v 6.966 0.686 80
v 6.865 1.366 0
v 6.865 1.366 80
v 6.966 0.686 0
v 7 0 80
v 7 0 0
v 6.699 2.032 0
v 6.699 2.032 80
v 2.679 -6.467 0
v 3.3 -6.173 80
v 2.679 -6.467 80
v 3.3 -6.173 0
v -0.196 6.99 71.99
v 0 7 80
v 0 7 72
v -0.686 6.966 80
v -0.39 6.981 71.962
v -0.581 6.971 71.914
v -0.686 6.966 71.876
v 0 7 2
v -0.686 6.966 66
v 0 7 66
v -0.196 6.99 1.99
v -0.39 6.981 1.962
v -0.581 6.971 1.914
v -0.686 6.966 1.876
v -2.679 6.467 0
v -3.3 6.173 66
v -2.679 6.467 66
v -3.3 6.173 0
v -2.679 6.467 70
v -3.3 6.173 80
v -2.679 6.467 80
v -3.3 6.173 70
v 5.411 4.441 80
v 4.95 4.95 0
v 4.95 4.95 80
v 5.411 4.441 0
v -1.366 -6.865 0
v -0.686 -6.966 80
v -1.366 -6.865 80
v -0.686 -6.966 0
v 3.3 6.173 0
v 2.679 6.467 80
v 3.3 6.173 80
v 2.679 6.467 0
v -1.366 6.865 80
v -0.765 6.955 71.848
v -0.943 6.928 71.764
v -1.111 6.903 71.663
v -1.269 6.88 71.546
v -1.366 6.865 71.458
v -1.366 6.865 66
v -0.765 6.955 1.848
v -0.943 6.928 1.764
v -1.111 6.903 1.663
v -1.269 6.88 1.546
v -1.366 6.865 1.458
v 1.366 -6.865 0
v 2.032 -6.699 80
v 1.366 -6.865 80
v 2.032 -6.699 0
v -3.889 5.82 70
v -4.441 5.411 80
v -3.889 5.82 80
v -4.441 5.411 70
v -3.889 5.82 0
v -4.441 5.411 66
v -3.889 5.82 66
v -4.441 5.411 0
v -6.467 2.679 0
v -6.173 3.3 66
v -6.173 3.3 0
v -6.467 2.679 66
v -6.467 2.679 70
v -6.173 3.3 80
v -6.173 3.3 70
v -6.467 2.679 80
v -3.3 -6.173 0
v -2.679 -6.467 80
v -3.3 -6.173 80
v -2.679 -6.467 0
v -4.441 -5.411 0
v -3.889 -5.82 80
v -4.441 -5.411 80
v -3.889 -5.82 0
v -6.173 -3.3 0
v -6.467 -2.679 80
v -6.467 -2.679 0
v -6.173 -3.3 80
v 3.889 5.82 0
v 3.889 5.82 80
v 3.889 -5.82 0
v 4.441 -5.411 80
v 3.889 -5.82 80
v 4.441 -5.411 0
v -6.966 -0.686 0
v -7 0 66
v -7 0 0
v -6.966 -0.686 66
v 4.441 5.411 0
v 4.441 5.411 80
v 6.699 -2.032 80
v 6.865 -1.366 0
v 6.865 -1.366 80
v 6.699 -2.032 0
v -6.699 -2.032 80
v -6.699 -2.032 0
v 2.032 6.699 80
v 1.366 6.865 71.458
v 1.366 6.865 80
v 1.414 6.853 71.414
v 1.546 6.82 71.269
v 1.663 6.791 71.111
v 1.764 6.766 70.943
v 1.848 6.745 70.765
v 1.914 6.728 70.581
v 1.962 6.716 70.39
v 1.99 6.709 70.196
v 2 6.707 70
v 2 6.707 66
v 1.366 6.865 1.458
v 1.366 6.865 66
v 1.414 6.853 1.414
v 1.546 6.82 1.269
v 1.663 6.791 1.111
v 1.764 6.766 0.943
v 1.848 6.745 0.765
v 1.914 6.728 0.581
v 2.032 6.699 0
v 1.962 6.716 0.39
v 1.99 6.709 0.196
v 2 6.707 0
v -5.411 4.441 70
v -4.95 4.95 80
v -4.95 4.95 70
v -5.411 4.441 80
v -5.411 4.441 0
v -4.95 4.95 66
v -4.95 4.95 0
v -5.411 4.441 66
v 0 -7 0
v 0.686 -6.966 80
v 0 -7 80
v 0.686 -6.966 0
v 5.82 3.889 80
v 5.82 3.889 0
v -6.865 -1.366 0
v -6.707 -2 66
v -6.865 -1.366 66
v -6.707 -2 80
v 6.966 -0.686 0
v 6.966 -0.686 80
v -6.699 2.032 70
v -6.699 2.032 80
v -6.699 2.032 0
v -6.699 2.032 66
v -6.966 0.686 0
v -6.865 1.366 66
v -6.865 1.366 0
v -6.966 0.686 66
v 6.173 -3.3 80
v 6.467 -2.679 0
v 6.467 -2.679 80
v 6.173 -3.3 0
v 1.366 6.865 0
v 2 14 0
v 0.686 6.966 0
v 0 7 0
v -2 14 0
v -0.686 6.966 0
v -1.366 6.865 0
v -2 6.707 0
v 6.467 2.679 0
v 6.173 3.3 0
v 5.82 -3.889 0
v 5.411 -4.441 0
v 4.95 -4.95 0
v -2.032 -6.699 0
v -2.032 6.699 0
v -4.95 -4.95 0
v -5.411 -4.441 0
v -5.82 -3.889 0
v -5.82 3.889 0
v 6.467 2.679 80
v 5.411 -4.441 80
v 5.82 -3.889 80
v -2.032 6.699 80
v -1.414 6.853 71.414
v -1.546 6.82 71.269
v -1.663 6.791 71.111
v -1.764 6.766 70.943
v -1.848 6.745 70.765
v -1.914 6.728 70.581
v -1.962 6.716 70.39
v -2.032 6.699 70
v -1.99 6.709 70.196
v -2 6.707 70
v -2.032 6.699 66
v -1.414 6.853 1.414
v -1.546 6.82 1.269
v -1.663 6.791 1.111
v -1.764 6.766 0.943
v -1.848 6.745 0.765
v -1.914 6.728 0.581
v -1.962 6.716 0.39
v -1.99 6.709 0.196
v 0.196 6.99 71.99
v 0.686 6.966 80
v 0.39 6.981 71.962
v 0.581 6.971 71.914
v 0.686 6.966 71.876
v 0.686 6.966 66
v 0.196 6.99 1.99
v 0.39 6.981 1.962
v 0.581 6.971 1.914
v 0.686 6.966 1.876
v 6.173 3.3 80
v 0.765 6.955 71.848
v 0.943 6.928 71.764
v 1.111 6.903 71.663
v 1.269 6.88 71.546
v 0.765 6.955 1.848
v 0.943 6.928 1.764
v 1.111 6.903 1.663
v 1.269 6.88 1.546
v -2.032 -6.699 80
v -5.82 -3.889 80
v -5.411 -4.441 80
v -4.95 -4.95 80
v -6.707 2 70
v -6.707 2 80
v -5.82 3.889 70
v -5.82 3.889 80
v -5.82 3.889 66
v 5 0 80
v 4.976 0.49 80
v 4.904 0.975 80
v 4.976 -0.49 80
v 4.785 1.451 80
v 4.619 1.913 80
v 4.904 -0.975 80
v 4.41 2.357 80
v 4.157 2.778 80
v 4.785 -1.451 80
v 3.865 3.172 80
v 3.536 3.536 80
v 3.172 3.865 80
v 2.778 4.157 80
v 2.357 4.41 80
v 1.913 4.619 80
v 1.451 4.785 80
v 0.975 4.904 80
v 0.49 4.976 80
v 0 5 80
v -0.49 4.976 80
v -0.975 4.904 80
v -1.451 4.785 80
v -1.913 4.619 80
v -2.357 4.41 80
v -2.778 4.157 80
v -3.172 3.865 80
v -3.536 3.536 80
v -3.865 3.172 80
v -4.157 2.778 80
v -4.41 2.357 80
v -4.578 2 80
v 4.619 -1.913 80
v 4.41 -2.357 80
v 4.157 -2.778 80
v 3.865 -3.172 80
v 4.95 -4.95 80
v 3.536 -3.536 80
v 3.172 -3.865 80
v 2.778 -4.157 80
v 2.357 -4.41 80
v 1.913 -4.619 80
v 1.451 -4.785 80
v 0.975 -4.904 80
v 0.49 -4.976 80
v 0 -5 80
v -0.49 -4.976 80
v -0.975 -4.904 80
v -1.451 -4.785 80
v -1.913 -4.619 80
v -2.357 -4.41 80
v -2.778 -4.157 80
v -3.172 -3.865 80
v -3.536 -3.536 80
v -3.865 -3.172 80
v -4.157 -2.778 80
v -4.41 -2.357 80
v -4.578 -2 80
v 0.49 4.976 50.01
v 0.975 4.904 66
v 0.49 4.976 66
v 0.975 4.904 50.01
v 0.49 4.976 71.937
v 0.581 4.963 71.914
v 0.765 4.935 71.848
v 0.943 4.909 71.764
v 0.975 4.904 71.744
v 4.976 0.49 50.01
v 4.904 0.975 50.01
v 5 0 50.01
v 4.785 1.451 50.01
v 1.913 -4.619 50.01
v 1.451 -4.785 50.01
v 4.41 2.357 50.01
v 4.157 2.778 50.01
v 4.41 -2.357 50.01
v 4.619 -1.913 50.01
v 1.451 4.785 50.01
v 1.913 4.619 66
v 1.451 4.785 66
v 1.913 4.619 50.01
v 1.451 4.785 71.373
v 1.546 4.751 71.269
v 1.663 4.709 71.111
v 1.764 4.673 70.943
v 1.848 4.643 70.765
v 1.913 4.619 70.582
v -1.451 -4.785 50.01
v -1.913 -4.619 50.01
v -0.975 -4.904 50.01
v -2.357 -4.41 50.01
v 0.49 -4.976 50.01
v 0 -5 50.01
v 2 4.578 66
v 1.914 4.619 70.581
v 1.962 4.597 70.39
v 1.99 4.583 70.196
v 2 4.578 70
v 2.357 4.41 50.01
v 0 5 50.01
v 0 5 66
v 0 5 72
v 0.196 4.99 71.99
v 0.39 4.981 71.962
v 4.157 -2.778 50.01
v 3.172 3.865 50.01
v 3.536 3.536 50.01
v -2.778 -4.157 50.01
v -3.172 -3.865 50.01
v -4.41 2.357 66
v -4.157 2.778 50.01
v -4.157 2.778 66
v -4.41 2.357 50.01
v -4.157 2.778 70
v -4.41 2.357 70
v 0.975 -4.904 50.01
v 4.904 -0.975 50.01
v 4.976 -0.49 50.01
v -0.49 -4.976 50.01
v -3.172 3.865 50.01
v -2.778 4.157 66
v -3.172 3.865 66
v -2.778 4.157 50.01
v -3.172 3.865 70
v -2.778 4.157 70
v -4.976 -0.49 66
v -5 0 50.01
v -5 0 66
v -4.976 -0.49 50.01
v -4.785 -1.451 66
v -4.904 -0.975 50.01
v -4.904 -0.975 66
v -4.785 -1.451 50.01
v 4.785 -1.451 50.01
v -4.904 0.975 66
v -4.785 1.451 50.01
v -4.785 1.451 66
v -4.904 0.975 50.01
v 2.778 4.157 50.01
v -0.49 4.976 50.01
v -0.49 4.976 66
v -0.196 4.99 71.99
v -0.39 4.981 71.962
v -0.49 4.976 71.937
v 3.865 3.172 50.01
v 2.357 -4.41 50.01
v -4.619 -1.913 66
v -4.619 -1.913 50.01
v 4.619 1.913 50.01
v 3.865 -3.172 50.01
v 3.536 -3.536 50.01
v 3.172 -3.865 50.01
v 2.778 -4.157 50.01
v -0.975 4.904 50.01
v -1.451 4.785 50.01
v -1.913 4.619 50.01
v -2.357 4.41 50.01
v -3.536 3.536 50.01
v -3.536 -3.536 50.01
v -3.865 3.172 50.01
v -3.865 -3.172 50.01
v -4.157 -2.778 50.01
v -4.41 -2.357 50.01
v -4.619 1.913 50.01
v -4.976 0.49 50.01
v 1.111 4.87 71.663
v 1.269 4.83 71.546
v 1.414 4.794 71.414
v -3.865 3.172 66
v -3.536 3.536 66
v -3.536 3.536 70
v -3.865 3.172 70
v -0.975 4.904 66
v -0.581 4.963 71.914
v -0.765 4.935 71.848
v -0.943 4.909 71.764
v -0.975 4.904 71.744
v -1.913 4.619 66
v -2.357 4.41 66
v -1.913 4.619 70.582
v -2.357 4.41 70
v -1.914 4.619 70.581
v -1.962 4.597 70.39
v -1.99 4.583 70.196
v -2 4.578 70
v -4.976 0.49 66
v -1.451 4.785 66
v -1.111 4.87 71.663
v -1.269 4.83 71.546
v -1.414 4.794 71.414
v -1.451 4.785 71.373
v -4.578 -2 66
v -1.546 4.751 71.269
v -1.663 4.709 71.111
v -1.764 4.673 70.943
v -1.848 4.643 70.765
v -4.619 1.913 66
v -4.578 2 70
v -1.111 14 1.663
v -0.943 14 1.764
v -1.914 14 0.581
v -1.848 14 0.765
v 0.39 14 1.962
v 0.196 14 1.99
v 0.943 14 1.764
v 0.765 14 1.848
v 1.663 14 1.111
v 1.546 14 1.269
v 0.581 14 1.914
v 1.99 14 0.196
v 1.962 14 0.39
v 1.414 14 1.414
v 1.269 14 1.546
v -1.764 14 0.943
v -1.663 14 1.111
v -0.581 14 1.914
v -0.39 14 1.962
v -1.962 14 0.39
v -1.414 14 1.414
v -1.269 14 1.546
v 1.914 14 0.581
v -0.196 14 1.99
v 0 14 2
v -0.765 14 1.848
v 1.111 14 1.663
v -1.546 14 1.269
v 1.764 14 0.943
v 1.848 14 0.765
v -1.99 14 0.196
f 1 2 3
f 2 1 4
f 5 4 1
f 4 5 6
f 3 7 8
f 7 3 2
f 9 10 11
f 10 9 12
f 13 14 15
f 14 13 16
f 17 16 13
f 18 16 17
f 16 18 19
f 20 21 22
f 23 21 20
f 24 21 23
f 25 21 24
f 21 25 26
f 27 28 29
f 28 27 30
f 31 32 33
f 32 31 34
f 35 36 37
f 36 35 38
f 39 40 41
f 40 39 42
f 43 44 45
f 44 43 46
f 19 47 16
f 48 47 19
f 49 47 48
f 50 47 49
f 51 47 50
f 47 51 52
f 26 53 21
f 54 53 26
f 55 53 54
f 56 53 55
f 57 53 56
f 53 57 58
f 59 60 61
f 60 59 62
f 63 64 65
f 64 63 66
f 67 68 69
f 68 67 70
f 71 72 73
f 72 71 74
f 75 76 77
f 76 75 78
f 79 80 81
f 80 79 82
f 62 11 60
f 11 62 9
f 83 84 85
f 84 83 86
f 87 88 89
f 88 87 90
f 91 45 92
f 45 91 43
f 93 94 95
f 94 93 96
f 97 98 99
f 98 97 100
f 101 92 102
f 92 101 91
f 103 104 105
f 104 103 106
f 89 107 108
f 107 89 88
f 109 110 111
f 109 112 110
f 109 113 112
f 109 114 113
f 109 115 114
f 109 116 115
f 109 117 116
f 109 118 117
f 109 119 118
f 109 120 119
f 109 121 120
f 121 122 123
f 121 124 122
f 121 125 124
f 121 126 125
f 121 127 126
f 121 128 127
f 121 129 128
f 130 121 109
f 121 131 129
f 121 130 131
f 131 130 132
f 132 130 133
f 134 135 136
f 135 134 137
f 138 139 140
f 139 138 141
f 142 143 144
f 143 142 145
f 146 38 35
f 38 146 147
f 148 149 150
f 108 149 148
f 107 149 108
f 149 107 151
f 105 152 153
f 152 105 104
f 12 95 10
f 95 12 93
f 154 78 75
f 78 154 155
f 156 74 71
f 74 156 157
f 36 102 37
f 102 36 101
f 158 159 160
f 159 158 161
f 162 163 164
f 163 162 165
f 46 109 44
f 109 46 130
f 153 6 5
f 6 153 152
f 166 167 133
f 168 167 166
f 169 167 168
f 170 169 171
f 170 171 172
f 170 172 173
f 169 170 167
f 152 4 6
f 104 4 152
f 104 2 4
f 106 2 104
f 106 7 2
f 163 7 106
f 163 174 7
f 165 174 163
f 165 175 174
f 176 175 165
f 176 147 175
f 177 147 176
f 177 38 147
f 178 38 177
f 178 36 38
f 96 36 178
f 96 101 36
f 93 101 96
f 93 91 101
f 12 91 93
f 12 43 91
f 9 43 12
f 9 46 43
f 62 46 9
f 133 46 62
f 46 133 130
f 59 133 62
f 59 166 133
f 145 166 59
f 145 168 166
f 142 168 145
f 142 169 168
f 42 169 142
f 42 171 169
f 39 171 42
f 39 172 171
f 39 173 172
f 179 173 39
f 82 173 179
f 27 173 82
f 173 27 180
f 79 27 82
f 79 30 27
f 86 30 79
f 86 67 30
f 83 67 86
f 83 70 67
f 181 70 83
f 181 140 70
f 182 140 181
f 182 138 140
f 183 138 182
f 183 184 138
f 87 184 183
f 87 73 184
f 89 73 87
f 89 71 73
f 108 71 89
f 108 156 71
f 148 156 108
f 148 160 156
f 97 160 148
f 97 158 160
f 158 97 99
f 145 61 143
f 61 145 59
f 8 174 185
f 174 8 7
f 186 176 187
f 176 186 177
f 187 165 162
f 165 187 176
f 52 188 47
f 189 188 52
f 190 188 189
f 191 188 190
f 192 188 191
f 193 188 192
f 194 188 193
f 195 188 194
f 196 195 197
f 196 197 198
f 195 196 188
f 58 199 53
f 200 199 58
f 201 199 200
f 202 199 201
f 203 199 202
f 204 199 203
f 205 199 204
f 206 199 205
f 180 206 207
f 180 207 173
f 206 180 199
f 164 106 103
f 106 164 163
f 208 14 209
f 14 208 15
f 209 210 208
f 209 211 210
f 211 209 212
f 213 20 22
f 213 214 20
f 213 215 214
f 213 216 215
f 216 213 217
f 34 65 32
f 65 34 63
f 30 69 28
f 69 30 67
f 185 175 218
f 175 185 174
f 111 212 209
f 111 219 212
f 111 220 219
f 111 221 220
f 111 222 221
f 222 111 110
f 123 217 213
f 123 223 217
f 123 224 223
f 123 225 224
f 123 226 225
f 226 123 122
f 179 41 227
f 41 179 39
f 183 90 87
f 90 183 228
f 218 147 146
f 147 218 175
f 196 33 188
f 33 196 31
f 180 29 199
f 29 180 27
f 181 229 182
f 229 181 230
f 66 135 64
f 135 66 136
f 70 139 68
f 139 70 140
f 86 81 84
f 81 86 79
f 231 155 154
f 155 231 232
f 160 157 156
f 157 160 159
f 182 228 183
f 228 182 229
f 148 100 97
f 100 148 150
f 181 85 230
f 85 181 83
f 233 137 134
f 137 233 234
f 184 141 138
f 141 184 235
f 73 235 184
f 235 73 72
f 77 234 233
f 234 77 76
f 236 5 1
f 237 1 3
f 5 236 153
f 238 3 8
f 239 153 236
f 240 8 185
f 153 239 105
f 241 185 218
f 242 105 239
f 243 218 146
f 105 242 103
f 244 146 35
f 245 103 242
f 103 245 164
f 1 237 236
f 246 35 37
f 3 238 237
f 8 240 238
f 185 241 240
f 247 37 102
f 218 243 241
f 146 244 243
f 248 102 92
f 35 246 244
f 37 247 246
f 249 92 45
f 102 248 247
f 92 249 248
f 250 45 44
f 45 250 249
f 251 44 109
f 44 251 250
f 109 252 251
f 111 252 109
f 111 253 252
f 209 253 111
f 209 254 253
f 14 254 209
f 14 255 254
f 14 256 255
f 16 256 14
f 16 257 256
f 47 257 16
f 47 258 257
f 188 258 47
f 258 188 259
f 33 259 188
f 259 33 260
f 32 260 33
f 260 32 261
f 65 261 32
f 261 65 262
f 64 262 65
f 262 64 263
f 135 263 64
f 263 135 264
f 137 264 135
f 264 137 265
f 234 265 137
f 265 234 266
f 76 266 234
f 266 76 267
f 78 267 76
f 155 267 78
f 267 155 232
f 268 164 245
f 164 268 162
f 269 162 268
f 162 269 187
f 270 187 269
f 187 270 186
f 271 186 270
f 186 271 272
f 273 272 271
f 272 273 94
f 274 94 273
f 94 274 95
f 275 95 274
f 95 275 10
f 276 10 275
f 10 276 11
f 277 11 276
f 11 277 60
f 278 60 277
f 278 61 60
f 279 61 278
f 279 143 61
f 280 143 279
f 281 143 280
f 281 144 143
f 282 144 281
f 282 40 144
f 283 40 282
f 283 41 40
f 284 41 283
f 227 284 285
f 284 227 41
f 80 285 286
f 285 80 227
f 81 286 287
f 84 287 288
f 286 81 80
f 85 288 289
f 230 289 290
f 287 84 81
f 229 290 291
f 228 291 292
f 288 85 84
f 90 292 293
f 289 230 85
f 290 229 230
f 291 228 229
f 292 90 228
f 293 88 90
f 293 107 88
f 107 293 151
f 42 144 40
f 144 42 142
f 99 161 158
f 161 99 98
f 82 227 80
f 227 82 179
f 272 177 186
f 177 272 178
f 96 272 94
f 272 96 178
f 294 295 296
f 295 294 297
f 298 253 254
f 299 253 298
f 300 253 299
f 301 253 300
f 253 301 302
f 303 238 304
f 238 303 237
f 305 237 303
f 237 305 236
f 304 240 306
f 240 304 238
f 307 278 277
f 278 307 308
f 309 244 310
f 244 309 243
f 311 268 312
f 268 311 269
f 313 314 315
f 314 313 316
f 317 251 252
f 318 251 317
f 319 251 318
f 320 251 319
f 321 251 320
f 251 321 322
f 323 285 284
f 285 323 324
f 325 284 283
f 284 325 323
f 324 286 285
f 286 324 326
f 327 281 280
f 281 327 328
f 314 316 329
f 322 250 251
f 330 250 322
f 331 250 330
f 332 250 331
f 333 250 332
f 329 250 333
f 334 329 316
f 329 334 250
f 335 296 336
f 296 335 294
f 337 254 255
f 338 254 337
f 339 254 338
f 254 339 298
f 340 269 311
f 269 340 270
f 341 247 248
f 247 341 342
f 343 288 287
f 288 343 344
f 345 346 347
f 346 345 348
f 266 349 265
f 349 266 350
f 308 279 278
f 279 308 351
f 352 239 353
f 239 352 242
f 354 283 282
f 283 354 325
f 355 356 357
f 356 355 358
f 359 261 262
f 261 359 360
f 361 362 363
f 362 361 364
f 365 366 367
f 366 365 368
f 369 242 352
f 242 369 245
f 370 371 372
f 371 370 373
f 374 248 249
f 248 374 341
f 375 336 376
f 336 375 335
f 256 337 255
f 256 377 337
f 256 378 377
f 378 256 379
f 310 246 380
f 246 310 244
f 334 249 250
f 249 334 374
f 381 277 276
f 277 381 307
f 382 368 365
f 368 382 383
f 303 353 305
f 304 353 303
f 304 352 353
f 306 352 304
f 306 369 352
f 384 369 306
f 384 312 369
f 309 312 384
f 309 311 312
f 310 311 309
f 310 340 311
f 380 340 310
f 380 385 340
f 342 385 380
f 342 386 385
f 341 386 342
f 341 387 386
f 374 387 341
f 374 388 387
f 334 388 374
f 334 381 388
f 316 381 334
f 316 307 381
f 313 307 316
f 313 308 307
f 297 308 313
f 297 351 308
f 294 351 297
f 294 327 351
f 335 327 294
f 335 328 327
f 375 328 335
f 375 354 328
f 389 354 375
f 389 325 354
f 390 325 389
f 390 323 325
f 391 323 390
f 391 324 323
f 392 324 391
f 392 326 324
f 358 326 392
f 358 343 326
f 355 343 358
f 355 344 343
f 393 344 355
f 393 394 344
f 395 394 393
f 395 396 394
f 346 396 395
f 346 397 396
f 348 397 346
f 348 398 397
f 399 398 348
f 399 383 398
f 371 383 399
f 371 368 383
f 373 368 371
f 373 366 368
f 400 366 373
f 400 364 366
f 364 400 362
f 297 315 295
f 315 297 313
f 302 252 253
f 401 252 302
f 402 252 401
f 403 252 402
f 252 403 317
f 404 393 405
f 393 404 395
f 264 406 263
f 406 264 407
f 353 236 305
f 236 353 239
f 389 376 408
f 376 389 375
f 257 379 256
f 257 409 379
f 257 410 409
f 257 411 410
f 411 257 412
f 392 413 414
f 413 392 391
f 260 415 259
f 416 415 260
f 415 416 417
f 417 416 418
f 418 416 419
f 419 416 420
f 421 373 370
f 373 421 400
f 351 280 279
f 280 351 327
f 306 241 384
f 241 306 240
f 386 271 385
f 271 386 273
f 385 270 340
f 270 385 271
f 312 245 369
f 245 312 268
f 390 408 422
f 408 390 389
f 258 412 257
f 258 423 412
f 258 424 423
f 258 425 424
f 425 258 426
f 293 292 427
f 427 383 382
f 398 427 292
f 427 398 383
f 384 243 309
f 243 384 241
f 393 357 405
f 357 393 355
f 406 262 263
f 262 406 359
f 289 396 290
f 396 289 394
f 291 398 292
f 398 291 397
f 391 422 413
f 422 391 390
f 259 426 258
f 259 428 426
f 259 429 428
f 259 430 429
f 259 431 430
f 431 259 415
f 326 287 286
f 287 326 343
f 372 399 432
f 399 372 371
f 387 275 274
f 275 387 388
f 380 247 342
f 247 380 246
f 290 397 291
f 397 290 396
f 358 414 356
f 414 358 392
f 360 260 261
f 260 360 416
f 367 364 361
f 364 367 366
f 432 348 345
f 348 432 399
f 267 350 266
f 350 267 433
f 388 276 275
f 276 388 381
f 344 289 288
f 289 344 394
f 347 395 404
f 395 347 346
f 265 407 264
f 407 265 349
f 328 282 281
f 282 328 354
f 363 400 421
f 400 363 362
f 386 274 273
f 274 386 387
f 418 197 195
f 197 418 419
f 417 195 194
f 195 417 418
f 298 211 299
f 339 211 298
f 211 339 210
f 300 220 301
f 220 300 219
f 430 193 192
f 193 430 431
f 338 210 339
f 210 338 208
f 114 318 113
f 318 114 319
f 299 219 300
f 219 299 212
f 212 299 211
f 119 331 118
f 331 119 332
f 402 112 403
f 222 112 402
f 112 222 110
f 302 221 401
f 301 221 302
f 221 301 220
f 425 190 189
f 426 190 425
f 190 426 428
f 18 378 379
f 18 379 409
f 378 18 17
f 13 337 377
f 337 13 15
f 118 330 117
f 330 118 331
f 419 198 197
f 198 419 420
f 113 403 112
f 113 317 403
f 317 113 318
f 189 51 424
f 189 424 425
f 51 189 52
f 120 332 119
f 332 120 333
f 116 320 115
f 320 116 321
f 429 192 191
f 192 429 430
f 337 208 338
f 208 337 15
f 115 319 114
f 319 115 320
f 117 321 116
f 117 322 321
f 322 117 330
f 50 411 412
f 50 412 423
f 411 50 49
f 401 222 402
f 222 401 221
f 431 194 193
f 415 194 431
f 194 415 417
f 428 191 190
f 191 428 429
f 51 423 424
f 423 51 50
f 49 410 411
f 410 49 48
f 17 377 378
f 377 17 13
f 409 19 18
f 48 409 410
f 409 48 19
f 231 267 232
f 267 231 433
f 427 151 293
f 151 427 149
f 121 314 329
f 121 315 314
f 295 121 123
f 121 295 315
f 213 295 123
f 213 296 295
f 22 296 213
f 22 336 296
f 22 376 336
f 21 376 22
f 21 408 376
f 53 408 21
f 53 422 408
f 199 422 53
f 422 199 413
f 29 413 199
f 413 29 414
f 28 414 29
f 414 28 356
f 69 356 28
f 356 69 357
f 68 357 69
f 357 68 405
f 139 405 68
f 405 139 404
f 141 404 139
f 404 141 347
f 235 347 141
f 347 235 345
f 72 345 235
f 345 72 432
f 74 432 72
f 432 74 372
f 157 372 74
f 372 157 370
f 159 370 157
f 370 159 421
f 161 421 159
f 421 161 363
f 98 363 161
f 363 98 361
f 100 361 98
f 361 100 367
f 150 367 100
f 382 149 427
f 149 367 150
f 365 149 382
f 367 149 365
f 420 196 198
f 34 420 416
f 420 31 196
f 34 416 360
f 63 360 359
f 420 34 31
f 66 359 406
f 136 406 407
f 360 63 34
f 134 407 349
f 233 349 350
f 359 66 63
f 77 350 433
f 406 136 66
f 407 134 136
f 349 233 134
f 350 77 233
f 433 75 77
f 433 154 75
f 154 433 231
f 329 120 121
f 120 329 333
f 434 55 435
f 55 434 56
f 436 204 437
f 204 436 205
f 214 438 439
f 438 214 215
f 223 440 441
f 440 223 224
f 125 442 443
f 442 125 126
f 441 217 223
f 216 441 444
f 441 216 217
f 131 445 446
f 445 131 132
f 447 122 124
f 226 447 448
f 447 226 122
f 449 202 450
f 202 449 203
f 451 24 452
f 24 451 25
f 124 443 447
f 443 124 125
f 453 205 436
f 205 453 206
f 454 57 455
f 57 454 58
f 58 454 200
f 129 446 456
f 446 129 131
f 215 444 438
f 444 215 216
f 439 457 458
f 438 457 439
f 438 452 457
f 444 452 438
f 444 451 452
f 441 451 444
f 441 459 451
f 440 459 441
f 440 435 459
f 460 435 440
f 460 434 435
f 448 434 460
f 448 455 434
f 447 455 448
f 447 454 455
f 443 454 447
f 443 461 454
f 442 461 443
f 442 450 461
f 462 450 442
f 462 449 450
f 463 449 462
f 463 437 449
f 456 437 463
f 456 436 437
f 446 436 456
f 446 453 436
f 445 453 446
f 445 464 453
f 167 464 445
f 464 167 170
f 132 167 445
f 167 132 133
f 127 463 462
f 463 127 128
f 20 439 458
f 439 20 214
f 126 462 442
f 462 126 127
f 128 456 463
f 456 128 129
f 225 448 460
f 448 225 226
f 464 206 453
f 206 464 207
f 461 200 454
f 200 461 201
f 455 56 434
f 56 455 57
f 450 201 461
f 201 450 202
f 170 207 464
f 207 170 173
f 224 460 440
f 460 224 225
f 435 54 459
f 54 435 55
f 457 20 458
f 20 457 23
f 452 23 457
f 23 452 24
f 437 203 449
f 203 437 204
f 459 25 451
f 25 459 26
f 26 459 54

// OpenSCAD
extensionInnerDiameter = 10;
extensionOuterDiameter = 14;
extensionLength = 80;
extensionCutoutLength = 30;

safetyPinDiameter = 4;
safetyPinLength = 7;

lockingGrooveWidth = 4;
lockingGrooveAngleOffset = 90;
lockingGrooveFinalSpotZOffset = 10;
lockingGrooveExtraLength = 2;
lockingGrooveFullLength = lockingGrooveFinalSpotZOffset + lockingGrooveExtraLength + lockingGrooveWidth / 2;



$fn = 64;




difference()
{
    // main tube
    cylinder(d = extensionOuterDiameter, extensionLength);

    // main tube inner cutout
    translate([0, 0, extensionLength - extensionCutoutLength + 0.01])
        cylinder(d = extensionInnerDiameter, extensionCutoutLength);

    // groove final position
    translate([0, 0, extensionLength - lockingGrooveFinalSpotZOffset])
        rotate([-90, 0, 0])
            cylinder(d = lockingGrooveWidth, extensionOuterDiameter);

    // groove length
    rotate([0, 0, lockingGrooveAngleOffset])
        translate([-lockingGrooveWidth / 2, 0, extensionLength - lockingGrooveFullLength])
            cube([lockingGrooveWidth, extensionOuterDiameter, lockingGrooveFullLength + 0.01]);

    // groove connector
    translate([lockingGrooveWidth / 2, 0, extensionLength - lockingGrooveFullLength])
        rotate([0, 0, 90])
            cube([extensionOuterDiameter, extensionOuterDiameter, lockingGrooveWidth]);
}

difference()
{
    // safety pin
    rotate([-90, 0, 0])
        cylinder(d = safetyPinDiameter, h = safetyPinLength + extensionOuterDiameter / 2);

    // cutting safety pin flat at the bottom
    translate([0, 0, -safetyPinDiameter / 2])
        cube([extensionOuterDiameter + safetyPinLength * 3, extensionOuterDiameter + safetyPinLength * 3, safetyPinDiameter], center = true);
}
